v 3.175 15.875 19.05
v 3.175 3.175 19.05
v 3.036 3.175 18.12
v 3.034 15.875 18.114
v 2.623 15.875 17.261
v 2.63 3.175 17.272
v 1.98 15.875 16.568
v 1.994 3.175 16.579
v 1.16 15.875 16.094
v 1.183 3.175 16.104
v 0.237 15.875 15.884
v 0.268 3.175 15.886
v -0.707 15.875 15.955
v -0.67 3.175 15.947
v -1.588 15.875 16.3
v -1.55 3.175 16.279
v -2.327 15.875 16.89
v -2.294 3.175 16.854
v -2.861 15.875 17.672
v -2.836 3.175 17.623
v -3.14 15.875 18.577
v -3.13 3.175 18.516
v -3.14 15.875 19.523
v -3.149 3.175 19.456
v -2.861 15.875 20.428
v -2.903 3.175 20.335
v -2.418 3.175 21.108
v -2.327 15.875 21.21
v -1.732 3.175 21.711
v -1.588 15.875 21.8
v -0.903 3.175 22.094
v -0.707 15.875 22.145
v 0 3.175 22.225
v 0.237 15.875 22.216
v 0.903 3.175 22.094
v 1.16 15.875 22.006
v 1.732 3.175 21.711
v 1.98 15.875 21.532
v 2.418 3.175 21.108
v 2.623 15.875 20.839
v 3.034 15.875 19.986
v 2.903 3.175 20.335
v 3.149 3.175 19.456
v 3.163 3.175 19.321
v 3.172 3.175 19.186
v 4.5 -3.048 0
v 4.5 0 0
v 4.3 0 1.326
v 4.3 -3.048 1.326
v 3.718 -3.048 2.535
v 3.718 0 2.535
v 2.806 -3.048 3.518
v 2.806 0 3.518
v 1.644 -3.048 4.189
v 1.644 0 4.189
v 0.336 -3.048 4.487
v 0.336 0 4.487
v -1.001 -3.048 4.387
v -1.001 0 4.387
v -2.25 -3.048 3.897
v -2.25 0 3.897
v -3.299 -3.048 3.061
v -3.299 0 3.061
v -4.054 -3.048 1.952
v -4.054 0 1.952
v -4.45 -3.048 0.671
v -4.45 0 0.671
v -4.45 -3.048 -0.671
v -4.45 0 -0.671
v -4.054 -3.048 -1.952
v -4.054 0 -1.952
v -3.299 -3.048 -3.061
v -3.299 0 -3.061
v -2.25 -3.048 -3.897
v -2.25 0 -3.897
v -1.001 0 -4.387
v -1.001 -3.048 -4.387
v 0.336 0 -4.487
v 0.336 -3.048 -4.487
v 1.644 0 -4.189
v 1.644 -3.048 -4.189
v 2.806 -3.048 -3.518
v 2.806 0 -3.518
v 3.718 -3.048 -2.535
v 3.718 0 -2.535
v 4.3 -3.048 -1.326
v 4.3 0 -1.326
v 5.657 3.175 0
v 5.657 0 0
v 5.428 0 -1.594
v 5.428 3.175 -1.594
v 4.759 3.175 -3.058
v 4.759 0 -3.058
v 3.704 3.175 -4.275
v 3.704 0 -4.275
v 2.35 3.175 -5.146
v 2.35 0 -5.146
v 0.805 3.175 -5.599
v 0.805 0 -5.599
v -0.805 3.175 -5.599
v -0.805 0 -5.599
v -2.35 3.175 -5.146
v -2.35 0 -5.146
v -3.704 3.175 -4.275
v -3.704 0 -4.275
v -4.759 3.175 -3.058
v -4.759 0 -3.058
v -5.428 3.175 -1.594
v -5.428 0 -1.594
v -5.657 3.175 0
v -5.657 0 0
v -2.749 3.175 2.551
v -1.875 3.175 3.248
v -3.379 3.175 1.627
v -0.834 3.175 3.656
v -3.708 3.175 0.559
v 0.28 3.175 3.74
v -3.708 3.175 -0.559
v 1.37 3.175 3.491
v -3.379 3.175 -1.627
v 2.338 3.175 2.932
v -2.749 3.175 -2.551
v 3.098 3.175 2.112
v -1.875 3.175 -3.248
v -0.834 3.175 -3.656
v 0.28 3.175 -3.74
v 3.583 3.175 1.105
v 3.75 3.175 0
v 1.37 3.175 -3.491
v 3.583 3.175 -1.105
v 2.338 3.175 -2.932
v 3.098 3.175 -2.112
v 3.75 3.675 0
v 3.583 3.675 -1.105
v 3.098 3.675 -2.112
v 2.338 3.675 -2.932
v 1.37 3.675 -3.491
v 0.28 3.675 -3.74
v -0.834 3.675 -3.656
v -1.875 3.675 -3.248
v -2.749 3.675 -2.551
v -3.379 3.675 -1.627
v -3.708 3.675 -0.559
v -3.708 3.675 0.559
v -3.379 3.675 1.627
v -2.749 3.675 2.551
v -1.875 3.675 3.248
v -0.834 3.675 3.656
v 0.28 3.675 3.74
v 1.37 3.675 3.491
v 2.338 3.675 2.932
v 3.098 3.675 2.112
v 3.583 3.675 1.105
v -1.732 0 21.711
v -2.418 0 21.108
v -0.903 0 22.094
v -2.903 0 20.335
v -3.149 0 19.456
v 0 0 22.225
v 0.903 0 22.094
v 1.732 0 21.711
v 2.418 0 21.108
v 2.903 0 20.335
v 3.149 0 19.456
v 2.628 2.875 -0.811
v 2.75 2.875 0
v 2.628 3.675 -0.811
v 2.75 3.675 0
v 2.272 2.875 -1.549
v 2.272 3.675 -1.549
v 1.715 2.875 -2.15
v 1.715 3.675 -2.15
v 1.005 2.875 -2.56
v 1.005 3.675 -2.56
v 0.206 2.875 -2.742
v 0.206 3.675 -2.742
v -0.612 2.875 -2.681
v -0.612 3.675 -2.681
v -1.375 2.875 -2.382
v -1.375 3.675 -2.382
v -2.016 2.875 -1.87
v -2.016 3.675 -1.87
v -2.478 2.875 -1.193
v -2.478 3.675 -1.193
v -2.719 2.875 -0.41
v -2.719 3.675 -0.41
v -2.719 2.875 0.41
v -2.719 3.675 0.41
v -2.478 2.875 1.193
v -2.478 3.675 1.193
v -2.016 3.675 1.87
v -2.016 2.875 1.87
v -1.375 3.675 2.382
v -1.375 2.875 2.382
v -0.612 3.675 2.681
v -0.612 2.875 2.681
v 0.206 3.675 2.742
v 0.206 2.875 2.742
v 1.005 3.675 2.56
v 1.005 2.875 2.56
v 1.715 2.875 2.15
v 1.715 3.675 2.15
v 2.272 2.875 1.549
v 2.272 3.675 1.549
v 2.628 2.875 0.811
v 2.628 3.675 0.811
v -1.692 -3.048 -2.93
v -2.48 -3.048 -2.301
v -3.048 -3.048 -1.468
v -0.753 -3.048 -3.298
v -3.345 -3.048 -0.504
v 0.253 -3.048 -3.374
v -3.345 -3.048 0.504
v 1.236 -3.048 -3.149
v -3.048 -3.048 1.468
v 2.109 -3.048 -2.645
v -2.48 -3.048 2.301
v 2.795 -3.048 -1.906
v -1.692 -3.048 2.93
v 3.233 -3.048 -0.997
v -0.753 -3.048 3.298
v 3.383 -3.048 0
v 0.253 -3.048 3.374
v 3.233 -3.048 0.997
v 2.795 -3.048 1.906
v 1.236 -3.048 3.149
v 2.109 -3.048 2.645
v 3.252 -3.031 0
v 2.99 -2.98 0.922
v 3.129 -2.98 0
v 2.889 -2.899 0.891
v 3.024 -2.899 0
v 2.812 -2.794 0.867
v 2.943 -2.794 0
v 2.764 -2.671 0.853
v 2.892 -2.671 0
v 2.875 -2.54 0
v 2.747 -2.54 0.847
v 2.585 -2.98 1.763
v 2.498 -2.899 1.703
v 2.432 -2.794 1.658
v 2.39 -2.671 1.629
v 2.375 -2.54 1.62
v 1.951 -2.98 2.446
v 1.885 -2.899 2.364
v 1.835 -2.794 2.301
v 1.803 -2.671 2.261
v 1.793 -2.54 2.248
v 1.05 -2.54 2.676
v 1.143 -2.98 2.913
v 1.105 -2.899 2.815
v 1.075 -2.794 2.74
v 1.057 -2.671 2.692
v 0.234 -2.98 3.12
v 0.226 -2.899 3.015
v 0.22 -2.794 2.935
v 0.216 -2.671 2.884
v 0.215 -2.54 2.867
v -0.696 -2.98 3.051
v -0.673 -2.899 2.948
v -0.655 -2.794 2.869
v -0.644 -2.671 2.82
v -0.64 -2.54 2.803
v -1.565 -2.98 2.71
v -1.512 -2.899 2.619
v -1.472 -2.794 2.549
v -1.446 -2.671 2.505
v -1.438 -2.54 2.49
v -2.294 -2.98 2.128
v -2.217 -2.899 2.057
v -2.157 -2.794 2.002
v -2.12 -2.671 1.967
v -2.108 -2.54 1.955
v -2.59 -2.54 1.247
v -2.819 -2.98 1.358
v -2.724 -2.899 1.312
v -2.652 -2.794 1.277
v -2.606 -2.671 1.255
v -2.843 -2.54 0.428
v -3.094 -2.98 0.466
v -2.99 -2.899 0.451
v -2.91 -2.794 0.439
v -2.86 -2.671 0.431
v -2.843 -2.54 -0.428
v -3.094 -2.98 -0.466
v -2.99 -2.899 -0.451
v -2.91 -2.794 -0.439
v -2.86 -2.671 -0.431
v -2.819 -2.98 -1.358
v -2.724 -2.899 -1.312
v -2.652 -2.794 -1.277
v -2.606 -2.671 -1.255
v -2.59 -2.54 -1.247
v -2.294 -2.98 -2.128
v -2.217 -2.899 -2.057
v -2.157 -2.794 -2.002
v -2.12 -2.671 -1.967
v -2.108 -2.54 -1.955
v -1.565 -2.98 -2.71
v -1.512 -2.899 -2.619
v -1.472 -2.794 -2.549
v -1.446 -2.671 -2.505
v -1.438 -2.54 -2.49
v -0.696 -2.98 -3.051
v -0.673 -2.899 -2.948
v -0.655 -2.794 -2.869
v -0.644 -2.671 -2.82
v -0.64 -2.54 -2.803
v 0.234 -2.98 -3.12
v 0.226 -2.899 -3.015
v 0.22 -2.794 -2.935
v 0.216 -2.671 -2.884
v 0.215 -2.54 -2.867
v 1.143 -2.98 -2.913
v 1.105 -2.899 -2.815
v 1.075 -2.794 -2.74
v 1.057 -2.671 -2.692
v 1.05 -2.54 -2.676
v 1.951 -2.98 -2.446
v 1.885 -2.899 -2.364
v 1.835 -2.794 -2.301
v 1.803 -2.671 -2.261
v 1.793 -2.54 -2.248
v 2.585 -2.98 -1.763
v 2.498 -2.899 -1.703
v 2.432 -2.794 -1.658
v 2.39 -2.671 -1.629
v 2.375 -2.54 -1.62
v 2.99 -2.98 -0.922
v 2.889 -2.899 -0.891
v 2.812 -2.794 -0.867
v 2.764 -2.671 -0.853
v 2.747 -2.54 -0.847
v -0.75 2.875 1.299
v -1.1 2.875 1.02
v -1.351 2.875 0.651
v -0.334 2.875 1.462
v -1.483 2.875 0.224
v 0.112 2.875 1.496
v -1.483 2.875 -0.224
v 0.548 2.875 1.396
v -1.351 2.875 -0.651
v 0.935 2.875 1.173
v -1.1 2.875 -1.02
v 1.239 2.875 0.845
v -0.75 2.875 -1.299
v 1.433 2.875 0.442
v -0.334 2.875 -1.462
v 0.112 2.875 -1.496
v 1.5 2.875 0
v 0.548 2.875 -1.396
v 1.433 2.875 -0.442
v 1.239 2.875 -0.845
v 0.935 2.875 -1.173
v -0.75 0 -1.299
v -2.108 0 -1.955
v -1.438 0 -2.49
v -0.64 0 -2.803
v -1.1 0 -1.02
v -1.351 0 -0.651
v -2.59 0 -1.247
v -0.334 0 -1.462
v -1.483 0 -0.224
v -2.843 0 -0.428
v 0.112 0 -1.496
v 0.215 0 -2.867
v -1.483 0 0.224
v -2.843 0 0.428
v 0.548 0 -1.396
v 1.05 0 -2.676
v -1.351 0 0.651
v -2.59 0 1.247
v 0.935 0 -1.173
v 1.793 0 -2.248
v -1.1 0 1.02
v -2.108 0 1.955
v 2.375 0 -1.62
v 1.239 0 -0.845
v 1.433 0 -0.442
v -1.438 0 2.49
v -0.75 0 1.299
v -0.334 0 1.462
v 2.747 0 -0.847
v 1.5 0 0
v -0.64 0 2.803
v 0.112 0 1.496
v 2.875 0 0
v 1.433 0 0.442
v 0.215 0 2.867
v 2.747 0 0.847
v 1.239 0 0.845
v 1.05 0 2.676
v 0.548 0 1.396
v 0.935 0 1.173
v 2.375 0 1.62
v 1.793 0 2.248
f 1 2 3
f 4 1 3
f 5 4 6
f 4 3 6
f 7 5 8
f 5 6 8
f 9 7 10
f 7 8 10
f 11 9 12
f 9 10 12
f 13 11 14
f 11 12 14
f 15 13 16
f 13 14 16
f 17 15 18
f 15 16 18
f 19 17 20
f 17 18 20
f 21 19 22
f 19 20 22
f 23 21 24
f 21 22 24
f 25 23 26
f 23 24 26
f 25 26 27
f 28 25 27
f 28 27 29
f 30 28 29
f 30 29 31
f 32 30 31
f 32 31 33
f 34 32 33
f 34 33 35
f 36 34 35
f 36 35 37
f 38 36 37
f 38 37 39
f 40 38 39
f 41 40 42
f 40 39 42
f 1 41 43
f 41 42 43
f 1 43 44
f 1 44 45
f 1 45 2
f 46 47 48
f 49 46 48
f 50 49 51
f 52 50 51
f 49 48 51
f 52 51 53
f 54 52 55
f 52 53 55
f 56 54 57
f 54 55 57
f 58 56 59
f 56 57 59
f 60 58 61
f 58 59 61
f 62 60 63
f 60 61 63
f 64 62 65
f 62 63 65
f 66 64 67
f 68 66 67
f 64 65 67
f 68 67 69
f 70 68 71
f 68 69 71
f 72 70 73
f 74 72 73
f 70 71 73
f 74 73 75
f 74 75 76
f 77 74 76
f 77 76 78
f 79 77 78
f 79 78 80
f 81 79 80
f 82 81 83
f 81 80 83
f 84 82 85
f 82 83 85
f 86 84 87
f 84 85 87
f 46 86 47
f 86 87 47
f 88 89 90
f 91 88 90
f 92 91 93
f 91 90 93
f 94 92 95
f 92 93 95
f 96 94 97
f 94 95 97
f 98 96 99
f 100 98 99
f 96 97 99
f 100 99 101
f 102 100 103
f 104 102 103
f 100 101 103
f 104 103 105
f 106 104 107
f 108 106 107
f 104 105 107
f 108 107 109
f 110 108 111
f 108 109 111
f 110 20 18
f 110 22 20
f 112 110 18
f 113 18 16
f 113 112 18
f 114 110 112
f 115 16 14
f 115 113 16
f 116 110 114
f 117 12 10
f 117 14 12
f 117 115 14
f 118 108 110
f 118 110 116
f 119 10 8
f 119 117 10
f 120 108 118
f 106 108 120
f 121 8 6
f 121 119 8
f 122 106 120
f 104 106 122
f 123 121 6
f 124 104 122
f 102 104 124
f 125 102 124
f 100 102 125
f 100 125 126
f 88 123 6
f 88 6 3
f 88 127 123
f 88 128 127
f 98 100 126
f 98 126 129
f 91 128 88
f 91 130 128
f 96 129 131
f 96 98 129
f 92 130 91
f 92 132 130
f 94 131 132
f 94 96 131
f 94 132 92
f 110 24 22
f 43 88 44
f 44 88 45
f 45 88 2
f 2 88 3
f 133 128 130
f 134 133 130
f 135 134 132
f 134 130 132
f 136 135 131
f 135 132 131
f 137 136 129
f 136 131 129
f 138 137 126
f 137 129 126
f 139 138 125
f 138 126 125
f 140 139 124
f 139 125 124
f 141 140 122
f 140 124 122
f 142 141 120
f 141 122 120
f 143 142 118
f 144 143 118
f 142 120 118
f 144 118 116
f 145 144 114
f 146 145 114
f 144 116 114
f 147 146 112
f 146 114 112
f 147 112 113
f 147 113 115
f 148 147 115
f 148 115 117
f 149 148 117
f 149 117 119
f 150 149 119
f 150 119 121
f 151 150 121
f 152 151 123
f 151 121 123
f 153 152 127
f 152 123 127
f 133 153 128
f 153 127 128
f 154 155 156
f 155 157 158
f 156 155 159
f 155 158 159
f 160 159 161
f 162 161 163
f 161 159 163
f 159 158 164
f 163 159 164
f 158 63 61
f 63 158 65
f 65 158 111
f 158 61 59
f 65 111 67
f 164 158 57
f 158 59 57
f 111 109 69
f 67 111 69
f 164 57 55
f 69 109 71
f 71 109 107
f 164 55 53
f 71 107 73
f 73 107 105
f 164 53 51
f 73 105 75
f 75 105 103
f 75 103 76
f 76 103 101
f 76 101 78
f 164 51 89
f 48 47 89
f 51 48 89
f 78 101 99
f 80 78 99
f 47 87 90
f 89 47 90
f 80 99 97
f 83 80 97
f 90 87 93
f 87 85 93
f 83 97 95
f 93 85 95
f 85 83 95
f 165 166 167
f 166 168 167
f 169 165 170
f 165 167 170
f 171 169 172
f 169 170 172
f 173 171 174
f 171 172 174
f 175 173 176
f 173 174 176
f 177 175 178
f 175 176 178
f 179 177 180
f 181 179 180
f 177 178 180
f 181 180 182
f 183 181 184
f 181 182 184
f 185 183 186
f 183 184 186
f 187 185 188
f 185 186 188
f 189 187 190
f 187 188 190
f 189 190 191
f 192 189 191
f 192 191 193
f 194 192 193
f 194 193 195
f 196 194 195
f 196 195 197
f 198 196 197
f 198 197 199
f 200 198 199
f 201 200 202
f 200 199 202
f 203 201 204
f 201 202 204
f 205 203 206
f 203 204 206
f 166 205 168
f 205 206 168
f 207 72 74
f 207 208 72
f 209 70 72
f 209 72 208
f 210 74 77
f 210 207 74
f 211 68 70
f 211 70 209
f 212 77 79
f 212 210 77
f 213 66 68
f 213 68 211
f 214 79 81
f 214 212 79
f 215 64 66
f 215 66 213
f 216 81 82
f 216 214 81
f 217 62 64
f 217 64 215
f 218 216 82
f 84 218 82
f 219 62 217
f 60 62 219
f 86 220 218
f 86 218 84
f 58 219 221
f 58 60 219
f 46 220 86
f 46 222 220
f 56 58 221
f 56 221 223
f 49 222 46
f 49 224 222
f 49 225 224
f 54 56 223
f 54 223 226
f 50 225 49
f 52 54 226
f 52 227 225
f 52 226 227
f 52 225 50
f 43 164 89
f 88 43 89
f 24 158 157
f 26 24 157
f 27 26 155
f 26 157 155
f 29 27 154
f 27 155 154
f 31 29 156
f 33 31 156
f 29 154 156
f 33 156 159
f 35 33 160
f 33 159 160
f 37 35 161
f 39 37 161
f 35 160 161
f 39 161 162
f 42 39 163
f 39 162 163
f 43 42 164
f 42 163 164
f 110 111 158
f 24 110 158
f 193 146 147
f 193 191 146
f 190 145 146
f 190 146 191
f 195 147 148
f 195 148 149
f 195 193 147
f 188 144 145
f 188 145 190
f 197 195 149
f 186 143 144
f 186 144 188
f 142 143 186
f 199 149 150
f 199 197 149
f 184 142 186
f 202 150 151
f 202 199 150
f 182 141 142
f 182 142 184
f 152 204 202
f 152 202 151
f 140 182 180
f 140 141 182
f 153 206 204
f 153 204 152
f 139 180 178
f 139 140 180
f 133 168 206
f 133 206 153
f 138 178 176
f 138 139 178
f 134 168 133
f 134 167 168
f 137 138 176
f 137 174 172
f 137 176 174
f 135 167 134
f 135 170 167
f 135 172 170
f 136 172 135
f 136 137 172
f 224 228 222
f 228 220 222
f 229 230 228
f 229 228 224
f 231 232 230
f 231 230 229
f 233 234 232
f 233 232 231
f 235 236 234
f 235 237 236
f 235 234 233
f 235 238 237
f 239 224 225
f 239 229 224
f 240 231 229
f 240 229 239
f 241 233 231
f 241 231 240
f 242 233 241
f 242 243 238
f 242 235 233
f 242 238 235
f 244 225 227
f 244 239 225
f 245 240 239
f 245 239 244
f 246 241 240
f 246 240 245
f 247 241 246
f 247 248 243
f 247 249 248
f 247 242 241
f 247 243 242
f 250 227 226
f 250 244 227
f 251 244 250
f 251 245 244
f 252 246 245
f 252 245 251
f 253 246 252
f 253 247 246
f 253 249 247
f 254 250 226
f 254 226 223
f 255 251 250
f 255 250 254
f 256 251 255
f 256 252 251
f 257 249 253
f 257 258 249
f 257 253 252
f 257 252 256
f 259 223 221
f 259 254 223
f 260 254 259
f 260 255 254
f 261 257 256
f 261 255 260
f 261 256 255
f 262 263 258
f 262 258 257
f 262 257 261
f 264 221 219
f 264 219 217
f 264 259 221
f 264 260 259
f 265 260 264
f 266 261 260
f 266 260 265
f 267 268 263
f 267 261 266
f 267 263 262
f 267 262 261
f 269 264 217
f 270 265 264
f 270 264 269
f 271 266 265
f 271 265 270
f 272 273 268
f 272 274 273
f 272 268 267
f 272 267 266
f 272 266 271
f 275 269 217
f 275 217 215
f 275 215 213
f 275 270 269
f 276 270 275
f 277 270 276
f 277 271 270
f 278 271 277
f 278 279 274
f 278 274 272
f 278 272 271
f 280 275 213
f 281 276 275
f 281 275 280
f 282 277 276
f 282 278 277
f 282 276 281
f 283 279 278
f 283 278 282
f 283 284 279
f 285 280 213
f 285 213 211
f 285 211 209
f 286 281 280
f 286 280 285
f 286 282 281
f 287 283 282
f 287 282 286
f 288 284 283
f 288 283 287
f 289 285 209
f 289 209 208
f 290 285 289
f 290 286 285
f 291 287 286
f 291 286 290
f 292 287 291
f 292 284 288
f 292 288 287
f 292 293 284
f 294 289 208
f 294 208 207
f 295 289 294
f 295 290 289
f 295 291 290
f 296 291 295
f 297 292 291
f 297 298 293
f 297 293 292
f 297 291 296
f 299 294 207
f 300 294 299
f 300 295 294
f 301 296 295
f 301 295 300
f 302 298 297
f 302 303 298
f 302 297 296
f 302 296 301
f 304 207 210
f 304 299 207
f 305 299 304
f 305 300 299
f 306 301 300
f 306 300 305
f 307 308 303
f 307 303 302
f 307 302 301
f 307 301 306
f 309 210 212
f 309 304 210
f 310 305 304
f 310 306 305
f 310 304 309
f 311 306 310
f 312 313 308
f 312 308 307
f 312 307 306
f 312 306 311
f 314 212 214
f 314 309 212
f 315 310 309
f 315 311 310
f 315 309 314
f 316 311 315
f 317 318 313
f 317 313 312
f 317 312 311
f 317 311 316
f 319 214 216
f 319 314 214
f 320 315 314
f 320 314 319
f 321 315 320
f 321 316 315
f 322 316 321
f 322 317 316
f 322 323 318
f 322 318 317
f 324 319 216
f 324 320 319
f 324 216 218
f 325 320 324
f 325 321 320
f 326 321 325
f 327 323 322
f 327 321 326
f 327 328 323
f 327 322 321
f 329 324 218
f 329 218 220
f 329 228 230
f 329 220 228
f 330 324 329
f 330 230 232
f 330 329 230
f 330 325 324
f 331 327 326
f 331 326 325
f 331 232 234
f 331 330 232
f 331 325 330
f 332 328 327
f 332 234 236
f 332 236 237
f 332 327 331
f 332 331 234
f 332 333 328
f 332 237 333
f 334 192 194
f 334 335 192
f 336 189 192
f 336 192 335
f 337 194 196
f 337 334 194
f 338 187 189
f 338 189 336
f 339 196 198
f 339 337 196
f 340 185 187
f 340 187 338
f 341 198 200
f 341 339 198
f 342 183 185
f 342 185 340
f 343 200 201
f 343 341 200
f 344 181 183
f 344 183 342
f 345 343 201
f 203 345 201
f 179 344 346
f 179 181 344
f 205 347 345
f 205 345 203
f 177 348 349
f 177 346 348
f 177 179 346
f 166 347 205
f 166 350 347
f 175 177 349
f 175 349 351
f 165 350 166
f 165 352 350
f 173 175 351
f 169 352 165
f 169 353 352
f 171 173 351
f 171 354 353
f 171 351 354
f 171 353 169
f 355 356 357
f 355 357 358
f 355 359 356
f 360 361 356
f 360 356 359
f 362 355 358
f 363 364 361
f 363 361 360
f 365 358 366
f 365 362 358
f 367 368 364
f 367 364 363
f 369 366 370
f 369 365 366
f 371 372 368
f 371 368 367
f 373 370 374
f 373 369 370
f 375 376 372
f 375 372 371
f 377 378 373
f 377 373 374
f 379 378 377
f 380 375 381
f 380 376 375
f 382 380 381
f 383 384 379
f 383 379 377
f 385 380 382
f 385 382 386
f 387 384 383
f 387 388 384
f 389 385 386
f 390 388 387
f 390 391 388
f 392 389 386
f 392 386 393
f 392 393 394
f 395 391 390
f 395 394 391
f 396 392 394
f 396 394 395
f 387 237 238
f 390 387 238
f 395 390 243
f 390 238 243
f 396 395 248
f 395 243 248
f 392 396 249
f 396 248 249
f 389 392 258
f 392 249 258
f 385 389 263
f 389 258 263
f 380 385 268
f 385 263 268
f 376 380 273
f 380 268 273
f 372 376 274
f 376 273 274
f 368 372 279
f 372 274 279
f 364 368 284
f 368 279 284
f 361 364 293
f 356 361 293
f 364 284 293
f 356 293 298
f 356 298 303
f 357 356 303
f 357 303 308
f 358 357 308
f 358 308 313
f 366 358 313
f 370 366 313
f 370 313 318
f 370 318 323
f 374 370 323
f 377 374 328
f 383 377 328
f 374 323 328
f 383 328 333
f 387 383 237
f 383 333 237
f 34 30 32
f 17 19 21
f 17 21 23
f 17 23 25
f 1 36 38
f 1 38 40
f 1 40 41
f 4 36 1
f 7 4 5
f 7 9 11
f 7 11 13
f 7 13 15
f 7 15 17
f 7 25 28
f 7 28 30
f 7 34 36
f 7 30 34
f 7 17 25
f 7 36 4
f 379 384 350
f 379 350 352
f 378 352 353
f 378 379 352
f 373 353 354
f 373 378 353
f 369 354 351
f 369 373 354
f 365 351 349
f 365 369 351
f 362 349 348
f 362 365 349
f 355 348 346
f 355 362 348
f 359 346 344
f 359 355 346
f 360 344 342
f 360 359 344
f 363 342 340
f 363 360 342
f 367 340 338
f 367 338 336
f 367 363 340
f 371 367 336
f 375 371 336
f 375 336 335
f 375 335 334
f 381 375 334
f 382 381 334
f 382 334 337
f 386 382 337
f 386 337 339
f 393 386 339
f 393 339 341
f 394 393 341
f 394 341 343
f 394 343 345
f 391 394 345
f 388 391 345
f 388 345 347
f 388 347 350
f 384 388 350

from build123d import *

# Parameters (mm, degrees)
SKETCH1_R           = 1.5
BOSS_EXTRUDE1_DEPTH = 3.175
SKETCH2_R           = 3.75
SKETCH2_R_2         = 2.75
BOSS_EXTRUDE2_DEPTH = 0.5
SKETCH3_R           = 2.75
SKETCH3_R_2         = 1.5
CUT_EXTRUDE1_DEPTH  = 0.8
SKETCH4_R           = 4.5
SKETCH4_R_2         = 2.5
BOSS_EXTRUDE3_DEPTH = 3.048
SKETCH5_R           = 2.875
CUT_EXTRUDE3_DEPTH  = 3.048
SKETCH6_R           = 3.175
BOSS_EXTRUDE4_DEPTH = 12.7
FILLET1_R           = 0.508


with BuildPart() as part:
    # Sketch1 → Boss-Extrude1 (new body)
    with BuildSketch(Plane(origin=(0, 0, 0), x_dir=(1, 0, 0), z_dir=(0, 1, 0))):
        with BuildLine():
            Line((-5.656854249, 0), (-3.148946712, -19.45590591))
            ThreePointArc((-3.148946712, -19.45590591), (0, -22.225), (3.148946712, -19.45590591))
            Line((3.148946712, -19.45590591), (5.656854249, 0))
            ThreePointArc((5.656854249, 0), (0, 5.656854249), (-5.656854249, 0))
        make_face()
        Circle(SKETCH1_R, mode=Mode.SUBTRACT)
    extrude(amount=BOSS_EXTRUDE1_DEPTH)

    # Sketch2 → Boss-Extrude2 (add)
    with BuildSketch(Plane(origin=(0, 3.175, 0), x_dir=(1, 0, 0), z_dir=(0, 1, 0))):
        Circle(SKETCH2_R)
        Circle(SKETCH2_R_2, mode=Mode.SUBTRACT)
    extrude(amount=BOSS_EXTRUDE2_DEPTH)

    # Sketch3 → Cut-Extrude1 (cut)
    with BuildSketch(Plane(origin=(0, 3.675, 0), x_dir=(1, 0, 0), z_dir=(0, 1, 0))):
        Circle(SKETCH3_R)
        Circle(SKETCH3_R_2, mode=Mode.SUBTRACT)
    extrude(amount=-CUT_EXTRUDE1_DEPTH, mode=Mode.SUBTRACT)

    # Sketch4 → Boss-Extrude3 (add)
    with BuildSketch(Plane.XZ):
        Circle(SKETCH4_R)
        Circle(SKETCH4_R_2, mode=Mode.SUBTRACT)
    extrude(amount=BOSS_EXTRUDE3_DEPTH)

    # Sketch5 → Cut-Extrude3 (cut)
    with BuildSketch(Plane.XZ.offset(3.048)):
        Circle(SKETCH5_R)
    extrude(amount=-CUT_EXTRUDE3_DEPTH, mode=Mode.SUBTRACT)

    # Sketch6 → Boss-Extrude4 (add)
    with BuildSketch(Plane(origin=(0, 3.175, 0), x_dir=(1, 0, 0), z_dir=(0, 1, 0))):
        with Locations((0, -19.05)):
            Circle(SKETCH6_R)
    extrude(amount=BOSS_EXTRUDE4_DEPTH)

    # Fillet1
    fillet1_edges = [part.edges().sort_by_distance(p)[0] for p in [
        (-2.875, -3.048, 0),
    ]]
    fillet(fillet1_edges, radius=FILLET1_R)


solid = part.part
